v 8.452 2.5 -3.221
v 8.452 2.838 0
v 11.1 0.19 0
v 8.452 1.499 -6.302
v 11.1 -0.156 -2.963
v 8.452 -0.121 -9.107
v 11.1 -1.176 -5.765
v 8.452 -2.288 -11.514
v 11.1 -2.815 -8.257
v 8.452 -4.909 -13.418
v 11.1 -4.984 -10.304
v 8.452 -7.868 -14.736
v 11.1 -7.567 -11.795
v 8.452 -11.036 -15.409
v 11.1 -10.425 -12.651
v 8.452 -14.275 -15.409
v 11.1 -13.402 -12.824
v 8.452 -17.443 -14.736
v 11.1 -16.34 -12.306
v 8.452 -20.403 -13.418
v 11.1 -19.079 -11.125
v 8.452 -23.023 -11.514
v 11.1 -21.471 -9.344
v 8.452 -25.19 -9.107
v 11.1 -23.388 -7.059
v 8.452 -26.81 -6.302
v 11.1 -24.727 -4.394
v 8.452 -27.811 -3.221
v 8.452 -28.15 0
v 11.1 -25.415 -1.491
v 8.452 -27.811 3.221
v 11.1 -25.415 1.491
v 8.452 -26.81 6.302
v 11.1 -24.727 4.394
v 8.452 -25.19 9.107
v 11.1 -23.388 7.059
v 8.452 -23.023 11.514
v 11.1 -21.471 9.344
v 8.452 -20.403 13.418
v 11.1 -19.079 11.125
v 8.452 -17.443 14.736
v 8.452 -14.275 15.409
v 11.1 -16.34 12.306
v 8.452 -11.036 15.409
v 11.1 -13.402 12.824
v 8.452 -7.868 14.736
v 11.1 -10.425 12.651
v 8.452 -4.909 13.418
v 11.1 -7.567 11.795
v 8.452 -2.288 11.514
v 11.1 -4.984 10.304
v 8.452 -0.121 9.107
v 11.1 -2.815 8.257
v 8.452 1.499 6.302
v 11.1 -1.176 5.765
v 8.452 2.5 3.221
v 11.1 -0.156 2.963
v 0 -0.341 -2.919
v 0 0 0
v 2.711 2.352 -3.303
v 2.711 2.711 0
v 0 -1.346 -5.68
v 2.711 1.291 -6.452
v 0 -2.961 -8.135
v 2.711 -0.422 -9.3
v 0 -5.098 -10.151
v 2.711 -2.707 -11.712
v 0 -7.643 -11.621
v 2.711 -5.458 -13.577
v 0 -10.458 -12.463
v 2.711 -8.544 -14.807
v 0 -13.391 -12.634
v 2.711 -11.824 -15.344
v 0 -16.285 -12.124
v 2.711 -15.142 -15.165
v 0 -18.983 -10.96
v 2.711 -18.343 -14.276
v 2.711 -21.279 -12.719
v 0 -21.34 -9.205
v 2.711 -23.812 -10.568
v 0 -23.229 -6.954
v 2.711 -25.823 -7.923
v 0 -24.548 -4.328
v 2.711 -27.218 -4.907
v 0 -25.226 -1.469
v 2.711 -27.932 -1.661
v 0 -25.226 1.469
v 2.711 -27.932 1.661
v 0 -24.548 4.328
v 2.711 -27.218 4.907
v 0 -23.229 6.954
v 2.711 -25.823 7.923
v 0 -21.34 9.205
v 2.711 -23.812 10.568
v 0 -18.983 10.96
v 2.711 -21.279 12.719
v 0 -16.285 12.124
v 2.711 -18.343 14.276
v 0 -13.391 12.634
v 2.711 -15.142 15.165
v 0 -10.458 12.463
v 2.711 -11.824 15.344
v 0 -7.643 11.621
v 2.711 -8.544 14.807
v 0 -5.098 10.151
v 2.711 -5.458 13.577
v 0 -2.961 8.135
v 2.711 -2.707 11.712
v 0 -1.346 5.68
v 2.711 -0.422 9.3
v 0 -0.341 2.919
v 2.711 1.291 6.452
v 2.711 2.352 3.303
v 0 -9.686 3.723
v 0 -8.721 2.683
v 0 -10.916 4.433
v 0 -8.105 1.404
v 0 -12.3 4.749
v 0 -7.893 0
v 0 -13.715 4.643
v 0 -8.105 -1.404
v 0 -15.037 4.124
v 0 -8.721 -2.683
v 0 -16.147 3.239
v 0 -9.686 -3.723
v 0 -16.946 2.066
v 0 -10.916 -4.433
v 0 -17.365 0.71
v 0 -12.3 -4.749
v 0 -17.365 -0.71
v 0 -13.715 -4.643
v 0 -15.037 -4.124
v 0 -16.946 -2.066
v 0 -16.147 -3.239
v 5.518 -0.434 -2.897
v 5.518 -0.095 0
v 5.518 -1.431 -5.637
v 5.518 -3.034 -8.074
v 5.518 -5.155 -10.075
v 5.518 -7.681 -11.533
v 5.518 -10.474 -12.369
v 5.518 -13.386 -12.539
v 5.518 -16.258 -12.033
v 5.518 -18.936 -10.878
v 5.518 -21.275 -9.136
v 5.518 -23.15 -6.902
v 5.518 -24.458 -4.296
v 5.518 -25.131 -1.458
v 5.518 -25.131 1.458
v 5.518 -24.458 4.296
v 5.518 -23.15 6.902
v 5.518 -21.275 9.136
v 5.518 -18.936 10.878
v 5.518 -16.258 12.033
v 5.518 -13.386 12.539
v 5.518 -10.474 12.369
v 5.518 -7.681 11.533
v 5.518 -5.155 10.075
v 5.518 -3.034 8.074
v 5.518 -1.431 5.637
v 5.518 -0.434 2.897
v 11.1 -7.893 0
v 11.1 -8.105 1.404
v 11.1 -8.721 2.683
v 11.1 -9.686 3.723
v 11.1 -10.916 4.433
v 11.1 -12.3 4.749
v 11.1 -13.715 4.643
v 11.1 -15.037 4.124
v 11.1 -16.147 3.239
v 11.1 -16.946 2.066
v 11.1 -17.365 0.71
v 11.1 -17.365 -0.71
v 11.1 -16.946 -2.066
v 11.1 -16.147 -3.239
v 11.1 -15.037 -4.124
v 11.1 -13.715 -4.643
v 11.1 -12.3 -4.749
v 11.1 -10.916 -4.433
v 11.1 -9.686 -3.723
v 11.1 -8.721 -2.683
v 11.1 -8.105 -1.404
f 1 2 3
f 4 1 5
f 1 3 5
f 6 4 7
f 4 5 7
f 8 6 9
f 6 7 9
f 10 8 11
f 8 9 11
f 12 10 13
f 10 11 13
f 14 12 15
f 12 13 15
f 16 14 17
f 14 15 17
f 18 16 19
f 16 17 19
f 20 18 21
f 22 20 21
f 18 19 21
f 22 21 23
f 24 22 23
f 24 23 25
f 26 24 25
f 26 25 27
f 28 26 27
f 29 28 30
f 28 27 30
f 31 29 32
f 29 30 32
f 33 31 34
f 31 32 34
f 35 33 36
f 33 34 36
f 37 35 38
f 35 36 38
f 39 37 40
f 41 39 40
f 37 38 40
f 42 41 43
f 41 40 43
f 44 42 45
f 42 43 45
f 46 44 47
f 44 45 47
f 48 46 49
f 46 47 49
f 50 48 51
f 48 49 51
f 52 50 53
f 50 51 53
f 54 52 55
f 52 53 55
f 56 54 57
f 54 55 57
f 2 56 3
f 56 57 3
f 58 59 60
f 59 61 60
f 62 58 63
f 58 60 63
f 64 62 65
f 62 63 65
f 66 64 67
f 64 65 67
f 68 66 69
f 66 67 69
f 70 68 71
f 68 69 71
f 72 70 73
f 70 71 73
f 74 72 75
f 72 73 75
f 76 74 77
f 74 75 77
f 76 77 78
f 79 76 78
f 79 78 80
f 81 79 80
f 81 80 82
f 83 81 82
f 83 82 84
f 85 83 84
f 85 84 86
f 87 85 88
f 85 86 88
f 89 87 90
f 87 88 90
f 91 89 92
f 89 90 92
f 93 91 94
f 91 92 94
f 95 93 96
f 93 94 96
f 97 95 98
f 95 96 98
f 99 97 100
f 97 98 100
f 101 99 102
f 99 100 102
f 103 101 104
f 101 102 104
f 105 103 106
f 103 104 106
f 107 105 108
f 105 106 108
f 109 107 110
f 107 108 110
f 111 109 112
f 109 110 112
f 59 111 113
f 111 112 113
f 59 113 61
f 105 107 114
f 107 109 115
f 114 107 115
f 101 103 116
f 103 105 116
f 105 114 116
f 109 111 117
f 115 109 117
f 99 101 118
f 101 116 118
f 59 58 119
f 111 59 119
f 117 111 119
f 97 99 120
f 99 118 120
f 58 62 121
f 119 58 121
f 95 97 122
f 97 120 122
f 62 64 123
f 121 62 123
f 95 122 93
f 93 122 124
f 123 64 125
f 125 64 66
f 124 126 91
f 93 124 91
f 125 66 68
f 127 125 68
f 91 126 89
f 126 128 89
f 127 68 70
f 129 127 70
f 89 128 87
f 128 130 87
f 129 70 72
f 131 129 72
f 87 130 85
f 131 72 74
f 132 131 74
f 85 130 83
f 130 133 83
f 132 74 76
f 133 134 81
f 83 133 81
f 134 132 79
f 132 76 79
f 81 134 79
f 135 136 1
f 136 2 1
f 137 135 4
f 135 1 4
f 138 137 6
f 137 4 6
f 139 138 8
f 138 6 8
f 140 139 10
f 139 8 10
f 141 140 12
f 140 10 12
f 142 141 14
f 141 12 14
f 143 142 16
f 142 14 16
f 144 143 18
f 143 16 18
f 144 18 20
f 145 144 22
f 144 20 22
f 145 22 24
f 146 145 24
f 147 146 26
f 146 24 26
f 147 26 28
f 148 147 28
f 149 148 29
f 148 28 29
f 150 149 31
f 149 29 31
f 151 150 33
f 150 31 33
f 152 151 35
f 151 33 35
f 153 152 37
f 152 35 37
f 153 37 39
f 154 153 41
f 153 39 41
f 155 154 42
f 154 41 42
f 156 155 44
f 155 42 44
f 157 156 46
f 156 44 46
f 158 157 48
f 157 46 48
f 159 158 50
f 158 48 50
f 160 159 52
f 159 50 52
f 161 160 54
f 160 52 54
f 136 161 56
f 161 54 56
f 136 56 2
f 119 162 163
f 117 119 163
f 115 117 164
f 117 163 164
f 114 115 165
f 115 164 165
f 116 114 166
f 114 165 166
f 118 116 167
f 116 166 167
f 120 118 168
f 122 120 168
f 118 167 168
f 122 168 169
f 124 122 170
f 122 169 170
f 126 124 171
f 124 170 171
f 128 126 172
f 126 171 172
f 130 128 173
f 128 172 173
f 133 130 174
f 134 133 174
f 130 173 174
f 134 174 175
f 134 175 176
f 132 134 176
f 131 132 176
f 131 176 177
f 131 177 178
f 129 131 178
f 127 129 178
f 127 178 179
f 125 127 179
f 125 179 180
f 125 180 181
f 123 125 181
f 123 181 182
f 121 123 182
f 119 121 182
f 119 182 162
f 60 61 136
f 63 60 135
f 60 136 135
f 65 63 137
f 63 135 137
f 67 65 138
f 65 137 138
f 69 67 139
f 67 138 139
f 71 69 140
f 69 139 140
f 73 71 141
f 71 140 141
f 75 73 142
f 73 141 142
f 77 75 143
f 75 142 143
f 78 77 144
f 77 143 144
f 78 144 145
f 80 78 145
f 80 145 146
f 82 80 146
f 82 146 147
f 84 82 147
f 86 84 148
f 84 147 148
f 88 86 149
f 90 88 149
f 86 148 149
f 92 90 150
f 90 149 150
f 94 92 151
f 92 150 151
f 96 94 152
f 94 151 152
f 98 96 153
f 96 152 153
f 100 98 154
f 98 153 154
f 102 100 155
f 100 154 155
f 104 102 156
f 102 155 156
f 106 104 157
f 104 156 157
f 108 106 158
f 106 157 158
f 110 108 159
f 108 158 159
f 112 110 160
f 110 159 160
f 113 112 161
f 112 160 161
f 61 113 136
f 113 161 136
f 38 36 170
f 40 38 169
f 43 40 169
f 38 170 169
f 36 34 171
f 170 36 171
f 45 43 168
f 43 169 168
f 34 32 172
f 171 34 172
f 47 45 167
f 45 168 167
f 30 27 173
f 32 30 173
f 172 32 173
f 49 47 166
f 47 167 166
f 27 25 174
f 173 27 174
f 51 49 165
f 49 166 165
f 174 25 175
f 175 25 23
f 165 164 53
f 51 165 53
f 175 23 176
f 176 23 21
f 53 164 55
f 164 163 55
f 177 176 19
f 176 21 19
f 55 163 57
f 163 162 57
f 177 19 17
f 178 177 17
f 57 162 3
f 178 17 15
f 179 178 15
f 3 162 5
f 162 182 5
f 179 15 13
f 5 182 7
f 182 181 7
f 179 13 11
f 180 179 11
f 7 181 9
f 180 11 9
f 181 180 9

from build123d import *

# Parameters (mm, degrees)
SKETCH2_R          = 4.7625
CUT_EXTRUDE1_DEPTH = 34.995099077


with BuildPart() as part:
    # Sketch1 → Revolve1 (revolve)
    with BuildSketch(Plane.XY):
        Polygon((0, 0), (2.71145, 2.71145), (5.51815, -0.09525), (8.45185, 2.83845), (11.0998, 0.1905), (11.0998, -12.65555), (0, -12.65555), align=None)
    revolve(axis=Axis((11.0998, -12.65555, 0), (-1, 0, 0)))

    # Sketch2 → Cut-Extrude1 (cut, through all)
    with BuildSketch(Plane(origin=(11.0998, 0, 0), x_dir=(0, 0, -1), z_dir=(1, 0, 0))):
        with Locations(Location((0, -12.65555, 0), (0, 0, 90))):
            Circle(SKETCH2_R)
    extrude(amount=-CUT_EXTRUDE1_DEPTH, mode=Mode.SUBTRACT)


solid = part.part
